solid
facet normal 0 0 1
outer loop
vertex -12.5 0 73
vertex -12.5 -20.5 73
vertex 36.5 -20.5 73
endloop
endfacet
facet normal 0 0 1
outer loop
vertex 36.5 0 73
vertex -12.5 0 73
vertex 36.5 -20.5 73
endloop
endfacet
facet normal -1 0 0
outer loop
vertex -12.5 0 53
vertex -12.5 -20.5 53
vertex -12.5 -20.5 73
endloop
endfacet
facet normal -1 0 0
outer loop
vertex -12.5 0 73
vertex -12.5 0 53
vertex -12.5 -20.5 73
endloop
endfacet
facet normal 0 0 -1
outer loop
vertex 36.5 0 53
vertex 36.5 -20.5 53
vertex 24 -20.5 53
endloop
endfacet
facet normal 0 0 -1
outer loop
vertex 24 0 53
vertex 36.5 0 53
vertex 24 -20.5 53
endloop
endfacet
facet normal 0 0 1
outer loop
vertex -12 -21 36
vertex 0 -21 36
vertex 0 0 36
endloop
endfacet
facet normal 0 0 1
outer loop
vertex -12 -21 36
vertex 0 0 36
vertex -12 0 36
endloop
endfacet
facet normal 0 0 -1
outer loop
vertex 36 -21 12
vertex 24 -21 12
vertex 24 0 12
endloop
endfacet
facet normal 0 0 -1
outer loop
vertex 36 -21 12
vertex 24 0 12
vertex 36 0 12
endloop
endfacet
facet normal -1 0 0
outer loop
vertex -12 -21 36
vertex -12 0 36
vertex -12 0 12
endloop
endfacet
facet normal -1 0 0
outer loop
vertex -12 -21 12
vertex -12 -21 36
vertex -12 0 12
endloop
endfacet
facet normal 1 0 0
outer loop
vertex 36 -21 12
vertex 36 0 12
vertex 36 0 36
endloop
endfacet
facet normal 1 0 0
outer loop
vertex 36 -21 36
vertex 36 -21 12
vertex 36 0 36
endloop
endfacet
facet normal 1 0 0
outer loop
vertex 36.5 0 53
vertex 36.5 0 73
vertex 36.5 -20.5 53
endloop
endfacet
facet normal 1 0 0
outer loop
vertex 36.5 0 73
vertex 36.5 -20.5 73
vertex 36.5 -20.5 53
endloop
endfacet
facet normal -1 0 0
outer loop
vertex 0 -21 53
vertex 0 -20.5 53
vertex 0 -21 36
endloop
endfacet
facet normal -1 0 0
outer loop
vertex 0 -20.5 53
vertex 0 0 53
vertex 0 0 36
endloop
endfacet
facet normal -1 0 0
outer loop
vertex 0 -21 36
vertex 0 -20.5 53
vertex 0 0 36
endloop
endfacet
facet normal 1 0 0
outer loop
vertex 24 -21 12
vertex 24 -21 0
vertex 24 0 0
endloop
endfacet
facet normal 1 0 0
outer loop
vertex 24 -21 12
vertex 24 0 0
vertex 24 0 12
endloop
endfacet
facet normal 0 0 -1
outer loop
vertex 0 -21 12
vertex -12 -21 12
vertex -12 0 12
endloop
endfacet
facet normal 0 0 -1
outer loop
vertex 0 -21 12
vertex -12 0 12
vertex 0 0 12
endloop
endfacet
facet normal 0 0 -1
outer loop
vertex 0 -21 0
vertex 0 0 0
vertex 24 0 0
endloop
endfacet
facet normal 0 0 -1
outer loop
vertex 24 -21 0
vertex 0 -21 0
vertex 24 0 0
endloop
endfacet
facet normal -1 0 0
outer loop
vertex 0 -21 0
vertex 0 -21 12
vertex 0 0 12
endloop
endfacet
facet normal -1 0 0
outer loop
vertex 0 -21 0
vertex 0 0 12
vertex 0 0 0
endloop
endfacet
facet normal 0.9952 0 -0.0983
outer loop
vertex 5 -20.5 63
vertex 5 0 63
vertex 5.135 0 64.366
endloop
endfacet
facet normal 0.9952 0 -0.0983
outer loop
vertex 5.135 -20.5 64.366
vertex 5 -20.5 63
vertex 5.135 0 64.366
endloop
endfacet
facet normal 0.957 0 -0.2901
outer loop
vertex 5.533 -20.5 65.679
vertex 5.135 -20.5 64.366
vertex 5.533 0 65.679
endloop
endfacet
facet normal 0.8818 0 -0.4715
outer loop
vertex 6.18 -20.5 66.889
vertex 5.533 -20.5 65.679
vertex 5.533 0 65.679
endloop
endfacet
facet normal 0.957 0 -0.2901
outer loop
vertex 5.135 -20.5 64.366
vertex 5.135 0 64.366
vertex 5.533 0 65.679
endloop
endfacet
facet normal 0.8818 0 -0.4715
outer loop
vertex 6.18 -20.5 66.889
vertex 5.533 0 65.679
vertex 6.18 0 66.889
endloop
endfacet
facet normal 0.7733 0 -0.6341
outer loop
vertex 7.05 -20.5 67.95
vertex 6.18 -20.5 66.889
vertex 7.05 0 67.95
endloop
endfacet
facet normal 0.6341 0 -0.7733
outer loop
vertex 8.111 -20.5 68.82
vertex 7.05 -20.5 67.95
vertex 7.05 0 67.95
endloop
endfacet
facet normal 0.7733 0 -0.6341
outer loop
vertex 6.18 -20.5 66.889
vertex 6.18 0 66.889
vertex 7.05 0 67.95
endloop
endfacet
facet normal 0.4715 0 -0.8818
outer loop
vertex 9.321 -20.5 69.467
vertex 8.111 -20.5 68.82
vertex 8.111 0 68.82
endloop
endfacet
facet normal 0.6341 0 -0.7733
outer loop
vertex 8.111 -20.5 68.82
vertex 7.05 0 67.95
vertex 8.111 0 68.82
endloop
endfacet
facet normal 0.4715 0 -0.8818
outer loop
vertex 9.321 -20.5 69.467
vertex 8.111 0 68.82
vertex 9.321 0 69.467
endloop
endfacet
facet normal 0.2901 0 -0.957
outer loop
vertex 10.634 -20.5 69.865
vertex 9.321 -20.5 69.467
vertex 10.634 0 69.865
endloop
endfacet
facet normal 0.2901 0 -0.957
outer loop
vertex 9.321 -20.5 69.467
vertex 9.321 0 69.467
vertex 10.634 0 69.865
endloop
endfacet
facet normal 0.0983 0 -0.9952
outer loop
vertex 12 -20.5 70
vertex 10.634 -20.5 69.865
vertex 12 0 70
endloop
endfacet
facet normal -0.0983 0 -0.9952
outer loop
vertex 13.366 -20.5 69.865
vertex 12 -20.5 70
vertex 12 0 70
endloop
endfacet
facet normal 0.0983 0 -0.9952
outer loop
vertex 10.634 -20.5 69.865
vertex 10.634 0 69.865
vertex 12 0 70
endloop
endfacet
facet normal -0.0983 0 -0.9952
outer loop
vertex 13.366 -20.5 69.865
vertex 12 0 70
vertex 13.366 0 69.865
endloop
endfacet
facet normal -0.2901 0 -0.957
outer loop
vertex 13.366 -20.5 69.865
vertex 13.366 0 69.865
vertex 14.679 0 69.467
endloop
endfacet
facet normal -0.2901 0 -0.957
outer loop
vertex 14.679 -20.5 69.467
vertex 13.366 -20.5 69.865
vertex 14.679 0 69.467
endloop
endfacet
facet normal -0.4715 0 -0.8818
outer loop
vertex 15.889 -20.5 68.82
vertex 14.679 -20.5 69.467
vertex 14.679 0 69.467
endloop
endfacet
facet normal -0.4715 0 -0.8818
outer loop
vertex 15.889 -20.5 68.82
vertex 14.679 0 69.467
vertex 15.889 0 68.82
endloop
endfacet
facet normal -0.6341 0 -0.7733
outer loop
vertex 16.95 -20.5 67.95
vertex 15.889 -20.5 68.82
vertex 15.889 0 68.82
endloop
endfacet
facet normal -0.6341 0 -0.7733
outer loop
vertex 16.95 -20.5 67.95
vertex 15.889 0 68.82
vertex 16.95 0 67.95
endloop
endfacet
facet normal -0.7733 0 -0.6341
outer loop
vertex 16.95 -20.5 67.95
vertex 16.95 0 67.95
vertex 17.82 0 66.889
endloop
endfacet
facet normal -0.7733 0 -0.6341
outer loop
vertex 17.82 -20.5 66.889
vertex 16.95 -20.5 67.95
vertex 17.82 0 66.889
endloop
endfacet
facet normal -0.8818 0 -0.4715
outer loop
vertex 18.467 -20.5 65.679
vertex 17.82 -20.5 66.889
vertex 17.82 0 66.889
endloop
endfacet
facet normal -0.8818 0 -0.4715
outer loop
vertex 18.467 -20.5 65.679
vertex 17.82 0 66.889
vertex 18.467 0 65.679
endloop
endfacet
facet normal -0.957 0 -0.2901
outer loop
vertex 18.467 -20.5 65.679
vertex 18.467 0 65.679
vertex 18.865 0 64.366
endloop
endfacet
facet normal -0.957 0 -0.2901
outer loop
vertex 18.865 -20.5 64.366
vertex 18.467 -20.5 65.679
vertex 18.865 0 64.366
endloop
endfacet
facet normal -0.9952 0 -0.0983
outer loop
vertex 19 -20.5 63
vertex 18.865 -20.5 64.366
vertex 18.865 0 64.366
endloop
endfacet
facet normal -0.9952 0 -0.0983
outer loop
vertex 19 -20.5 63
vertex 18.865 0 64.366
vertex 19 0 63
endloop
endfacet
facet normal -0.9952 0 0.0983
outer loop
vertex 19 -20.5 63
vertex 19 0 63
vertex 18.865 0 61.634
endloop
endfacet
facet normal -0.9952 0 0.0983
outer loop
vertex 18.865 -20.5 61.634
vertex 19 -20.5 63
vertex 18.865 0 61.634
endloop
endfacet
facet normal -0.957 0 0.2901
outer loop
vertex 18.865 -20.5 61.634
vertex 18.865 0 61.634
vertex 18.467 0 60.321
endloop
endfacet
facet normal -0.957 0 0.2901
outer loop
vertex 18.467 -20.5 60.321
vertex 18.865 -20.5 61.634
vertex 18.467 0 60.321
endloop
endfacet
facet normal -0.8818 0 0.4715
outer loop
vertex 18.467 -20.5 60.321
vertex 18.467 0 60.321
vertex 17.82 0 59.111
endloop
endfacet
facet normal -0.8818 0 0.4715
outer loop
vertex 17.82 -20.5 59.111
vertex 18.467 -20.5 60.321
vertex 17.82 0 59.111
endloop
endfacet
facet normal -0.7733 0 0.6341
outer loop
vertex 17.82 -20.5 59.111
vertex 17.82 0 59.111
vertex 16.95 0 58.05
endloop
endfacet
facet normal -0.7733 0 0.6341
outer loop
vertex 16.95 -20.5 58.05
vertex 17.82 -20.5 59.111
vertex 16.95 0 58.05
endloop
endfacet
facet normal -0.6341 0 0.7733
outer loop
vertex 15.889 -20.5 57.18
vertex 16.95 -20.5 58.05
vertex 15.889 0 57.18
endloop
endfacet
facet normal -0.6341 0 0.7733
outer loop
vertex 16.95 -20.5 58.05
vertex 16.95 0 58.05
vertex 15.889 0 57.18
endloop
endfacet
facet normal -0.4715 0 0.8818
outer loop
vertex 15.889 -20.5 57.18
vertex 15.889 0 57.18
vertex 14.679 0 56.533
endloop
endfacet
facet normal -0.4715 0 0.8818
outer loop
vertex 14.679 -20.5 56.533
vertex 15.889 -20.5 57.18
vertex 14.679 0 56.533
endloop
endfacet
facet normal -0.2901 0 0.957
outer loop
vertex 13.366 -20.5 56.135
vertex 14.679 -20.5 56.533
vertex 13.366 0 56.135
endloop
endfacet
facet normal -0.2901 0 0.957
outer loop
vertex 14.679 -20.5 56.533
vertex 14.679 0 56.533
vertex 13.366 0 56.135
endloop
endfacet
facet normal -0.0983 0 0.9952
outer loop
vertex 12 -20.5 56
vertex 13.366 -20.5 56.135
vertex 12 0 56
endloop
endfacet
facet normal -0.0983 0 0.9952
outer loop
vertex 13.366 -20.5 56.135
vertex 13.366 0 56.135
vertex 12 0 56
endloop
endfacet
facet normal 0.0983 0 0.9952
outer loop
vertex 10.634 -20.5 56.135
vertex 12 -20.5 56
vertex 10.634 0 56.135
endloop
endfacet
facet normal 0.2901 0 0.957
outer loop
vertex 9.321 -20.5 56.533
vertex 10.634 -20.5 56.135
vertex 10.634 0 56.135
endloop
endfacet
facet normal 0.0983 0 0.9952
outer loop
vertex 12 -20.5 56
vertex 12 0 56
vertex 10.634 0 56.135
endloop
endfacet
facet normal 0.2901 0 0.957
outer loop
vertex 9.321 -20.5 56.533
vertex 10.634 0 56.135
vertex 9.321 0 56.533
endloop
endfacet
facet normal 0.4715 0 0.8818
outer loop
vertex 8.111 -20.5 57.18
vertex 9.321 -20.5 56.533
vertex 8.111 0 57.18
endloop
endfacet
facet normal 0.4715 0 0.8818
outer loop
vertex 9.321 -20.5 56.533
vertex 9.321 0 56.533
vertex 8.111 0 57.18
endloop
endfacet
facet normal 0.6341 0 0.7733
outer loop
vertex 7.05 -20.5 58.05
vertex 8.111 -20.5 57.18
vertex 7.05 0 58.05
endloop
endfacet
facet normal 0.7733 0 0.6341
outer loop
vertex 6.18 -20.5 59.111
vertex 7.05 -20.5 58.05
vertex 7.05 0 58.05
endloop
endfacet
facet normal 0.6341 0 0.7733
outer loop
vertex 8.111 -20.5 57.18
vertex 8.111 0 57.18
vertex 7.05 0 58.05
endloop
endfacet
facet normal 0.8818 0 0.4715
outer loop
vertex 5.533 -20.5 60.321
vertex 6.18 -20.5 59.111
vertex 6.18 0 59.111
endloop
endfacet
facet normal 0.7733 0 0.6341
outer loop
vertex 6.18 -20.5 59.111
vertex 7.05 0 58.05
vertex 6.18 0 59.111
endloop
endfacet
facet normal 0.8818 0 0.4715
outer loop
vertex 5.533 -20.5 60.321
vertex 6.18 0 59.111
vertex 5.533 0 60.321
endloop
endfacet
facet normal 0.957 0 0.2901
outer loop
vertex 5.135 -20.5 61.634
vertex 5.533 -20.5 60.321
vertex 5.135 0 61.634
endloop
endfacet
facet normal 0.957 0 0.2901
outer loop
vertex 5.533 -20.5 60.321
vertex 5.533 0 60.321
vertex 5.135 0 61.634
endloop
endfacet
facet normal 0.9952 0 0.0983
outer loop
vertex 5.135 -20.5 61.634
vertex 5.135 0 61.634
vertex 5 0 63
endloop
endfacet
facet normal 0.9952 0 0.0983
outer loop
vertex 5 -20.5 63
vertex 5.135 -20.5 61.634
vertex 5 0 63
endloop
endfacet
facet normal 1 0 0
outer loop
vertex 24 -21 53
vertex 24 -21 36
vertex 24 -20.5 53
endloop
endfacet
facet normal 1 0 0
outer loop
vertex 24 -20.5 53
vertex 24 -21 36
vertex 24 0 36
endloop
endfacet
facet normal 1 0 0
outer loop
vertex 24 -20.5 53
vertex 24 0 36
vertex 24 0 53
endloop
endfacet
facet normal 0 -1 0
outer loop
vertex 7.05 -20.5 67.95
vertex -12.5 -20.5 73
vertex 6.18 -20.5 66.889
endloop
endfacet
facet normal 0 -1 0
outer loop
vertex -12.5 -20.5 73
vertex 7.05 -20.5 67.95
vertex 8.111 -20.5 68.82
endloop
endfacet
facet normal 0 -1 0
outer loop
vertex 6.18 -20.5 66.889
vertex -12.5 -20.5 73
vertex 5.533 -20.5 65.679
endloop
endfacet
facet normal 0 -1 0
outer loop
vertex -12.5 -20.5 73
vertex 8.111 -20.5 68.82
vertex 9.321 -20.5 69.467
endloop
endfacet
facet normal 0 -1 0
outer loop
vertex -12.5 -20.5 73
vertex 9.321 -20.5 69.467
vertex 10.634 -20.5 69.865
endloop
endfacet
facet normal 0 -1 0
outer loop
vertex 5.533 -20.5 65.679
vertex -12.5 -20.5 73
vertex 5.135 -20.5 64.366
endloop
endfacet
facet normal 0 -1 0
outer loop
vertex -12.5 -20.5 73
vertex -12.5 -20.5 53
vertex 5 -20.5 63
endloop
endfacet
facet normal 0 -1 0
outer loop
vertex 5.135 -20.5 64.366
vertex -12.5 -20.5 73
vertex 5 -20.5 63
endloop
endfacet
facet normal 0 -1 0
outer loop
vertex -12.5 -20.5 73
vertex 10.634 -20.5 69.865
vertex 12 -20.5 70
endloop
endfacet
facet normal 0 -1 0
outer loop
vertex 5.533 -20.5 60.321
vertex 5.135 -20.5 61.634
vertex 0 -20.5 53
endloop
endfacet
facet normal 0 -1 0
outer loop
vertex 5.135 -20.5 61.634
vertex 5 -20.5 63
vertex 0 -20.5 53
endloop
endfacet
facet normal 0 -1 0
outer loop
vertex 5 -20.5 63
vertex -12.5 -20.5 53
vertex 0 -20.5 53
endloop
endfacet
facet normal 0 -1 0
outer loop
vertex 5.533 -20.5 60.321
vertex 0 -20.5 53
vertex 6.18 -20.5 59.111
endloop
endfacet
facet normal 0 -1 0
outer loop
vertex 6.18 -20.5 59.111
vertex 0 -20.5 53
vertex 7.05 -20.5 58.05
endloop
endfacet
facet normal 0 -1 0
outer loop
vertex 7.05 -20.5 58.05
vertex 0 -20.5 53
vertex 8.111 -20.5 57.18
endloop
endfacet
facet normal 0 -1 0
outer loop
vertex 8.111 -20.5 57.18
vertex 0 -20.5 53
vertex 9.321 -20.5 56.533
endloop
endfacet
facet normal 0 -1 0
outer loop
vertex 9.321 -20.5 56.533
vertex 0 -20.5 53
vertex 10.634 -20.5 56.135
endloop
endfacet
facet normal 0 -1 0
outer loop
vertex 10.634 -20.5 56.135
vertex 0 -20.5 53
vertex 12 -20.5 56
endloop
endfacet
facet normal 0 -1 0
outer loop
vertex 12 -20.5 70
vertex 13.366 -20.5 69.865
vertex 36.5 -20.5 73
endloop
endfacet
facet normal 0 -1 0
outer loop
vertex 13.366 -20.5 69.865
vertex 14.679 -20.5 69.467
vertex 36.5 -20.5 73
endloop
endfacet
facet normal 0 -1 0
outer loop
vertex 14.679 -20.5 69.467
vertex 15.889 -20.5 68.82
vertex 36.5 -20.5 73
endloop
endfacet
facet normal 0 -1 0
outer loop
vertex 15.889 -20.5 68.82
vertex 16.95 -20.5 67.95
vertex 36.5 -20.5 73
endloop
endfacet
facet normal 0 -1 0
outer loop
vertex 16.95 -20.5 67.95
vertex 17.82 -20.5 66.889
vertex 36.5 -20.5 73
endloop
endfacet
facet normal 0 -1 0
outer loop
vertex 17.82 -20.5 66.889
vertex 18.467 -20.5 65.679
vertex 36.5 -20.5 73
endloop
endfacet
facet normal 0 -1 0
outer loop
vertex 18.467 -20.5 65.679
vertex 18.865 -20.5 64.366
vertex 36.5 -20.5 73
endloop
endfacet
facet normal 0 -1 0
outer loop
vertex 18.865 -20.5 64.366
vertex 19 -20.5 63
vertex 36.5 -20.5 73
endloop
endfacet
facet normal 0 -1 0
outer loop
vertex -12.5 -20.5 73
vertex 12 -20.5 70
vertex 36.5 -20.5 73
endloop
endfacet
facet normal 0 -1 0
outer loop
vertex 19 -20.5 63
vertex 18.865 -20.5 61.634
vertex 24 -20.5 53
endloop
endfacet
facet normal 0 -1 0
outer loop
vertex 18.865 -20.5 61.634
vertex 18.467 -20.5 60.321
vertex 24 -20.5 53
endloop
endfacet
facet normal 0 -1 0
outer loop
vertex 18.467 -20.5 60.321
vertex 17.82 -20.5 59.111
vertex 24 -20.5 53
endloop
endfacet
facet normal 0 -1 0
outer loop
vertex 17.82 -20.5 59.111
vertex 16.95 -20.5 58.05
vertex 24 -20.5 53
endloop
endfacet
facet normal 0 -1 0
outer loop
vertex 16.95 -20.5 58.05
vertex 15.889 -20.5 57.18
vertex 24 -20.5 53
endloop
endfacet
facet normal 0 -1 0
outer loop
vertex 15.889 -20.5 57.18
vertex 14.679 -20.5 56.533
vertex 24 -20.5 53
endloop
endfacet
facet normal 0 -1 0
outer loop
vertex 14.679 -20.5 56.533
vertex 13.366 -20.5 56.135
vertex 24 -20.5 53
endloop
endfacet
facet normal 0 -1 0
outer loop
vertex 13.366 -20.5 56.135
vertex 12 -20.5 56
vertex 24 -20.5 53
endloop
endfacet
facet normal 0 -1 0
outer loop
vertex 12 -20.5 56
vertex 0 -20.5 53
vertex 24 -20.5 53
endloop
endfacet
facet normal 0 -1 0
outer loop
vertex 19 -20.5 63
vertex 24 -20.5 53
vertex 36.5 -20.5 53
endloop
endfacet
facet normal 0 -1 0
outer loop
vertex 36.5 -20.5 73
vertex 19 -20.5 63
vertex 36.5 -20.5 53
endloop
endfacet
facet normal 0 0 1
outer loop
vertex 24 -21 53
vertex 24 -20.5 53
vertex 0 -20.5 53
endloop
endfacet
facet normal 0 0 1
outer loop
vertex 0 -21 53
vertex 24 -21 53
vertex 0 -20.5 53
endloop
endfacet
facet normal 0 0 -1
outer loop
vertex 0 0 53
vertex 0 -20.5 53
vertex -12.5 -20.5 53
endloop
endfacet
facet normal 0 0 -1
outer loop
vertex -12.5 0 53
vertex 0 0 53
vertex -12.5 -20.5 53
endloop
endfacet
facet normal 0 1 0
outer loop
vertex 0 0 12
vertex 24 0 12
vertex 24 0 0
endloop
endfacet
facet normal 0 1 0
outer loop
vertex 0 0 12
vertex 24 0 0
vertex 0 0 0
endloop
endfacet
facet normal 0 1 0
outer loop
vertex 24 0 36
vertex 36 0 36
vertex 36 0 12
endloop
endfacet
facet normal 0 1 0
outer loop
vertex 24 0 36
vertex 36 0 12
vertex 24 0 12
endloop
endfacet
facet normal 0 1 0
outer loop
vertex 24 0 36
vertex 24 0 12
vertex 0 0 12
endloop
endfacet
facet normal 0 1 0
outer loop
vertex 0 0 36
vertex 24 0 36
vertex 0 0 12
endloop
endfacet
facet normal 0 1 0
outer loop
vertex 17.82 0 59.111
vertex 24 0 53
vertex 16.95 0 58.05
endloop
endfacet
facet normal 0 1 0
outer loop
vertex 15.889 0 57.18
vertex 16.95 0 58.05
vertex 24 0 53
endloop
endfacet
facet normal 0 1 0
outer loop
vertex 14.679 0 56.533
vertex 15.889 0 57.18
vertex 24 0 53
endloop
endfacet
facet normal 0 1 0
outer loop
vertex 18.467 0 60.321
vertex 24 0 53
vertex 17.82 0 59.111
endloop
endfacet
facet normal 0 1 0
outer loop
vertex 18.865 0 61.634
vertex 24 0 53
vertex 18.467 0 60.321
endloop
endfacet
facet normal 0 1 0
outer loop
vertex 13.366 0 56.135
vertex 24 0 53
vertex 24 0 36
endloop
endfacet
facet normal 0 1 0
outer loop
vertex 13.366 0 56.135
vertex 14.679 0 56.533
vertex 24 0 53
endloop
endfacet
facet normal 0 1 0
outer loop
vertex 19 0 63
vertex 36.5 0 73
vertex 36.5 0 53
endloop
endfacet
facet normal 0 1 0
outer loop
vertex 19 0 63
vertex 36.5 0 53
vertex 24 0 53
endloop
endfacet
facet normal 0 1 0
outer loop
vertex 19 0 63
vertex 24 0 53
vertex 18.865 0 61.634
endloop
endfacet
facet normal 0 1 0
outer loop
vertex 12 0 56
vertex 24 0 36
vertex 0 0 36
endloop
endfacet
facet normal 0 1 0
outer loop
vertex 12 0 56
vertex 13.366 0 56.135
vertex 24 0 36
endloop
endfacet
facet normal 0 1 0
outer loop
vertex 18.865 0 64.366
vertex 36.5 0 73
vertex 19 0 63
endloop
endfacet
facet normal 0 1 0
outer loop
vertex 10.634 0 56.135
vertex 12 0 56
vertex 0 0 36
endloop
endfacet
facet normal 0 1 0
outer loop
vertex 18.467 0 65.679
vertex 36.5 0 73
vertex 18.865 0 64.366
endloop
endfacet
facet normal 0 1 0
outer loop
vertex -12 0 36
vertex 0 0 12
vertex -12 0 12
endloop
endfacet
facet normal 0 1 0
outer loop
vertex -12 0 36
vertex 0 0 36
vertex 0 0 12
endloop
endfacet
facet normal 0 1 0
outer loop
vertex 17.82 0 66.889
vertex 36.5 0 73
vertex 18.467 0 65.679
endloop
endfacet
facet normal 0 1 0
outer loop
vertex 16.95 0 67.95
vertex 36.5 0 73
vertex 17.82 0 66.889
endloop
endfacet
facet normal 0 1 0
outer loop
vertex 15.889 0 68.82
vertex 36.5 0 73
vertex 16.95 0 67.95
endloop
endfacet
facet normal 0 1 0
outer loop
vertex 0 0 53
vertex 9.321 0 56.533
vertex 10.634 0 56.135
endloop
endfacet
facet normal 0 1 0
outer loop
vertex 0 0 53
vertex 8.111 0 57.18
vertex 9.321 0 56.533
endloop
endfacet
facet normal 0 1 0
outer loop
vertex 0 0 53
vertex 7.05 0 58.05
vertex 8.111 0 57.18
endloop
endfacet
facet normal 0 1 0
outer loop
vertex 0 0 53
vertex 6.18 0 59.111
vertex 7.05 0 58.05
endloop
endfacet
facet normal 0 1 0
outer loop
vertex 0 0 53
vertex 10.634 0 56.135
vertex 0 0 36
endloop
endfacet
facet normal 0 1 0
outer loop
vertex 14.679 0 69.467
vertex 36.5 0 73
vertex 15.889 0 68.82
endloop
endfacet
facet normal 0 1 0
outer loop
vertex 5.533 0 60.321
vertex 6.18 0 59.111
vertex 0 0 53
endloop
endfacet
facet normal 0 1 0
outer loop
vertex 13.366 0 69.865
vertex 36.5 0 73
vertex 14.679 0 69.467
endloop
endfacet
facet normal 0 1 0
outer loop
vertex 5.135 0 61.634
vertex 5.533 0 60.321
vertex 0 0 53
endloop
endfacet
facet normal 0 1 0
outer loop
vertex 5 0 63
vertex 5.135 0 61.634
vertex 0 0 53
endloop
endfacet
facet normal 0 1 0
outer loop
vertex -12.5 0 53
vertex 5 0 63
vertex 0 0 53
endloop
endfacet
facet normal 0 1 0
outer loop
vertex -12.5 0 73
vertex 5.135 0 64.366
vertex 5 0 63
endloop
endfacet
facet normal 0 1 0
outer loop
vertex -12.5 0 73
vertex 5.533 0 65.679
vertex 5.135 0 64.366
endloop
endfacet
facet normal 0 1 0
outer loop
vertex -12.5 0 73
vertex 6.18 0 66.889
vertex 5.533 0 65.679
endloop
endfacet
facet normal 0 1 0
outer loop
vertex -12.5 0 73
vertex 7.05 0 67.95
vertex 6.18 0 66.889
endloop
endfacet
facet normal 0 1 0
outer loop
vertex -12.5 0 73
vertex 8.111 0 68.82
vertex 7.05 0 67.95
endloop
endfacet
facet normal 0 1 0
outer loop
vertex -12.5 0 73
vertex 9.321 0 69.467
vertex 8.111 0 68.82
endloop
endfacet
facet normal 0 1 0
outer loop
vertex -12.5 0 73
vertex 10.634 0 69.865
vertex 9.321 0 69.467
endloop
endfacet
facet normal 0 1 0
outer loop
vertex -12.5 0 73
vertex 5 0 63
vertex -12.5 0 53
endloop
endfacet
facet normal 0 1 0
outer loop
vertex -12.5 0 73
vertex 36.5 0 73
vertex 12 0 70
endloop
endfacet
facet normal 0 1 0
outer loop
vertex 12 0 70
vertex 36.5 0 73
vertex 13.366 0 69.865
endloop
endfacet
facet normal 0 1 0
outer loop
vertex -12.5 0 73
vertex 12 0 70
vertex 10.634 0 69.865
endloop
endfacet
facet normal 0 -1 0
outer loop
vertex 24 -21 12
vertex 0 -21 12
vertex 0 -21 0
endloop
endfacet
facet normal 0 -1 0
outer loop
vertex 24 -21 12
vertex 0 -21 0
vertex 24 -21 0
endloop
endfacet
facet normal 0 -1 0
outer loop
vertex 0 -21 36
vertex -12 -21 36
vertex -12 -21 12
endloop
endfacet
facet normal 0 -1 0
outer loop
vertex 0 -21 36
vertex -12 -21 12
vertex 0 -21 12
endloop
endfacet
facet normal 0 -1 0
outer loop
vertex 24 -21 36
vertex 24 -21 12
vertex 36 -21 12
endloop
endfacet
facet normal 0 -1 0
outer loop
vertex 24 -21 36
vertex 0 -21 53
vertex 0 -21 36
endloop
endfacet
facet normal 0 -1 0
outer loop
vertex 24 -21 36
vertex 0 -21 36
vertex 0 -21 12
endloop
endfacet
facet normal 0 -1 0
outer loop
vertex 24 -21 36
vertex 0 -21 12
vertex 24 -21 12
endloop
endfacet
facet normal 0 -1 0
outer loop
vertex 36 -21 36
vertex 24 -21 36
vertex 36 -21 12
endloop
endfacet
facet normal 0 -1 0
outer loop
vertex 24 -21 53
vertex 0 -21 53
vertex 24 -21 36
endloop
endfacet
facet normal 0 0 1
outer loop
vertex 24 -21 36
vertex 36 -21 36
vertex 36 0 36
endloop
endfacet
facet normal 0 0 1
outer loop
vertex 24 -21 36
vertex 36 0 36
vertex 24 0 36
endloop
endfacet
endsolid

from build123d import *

# Parameters (mm, degrees)
F1_DEPTH = 21
F2_W     = 12.5
F2_H     = 20
F2_W_2   = 24
F3_DEPTH = 20
F5_DEPTH = 0.5
F6_R     = 7
F7_DEPTH = 25


with BuildPart() as f1:
    # F0 (on Front) → F1 (new body)
    with BuildSketch(Plane.XZ):
        Polygon((0, 12), (0, 0), (24, 0), (24, 12), (36, 12), (36, 36), (24, 36), (24, 53), (0, 53), (0, 36), (-12, 36), (-12, 12), align=None)
    extrude(amount=F1_DEPTH)

    # F2 (on face) → F3 (join)
    with BuildSketch(Plane.XY.offset(53)):
        with Locations((30.25, -10.5)):
            Rectangle(F2_W, F2_H)
        with Locations((12, -10.5)):
            Rectangle(F2_W_2, F2_H)
        with Locations((-6.25, -10.5)):
            Rectangle(F2_W, F2_H)
    extrude(amount=F3_DEPTH)

    # F4 (on face) → F5 (join)
    with BuildSketch(Plane(origin=(0, -0.5, 0), x_dir=(-1, 0, 0), z_dir=(0, 1, 0))):
        Polygon((12.5, 73), (-36.5, 73), (-36.5, 53), (-24, 53), (0, 53), (12.5, 53), align=None)
    extrude(amount=F5_DEPTH)

    # F6 (on face) → F7 (cut)
    with BuildSketch(Plane(origin=(0, 0, 0), x_dir=(-1, 0, 0), z_dir=(0, 1, 0))):
        with Locations((-12, 63)):
            Circle(F6_R)
    extrude(amount=-F7_DEPTH, mode=Mode.SUBTRACT)


solid = f1.part
